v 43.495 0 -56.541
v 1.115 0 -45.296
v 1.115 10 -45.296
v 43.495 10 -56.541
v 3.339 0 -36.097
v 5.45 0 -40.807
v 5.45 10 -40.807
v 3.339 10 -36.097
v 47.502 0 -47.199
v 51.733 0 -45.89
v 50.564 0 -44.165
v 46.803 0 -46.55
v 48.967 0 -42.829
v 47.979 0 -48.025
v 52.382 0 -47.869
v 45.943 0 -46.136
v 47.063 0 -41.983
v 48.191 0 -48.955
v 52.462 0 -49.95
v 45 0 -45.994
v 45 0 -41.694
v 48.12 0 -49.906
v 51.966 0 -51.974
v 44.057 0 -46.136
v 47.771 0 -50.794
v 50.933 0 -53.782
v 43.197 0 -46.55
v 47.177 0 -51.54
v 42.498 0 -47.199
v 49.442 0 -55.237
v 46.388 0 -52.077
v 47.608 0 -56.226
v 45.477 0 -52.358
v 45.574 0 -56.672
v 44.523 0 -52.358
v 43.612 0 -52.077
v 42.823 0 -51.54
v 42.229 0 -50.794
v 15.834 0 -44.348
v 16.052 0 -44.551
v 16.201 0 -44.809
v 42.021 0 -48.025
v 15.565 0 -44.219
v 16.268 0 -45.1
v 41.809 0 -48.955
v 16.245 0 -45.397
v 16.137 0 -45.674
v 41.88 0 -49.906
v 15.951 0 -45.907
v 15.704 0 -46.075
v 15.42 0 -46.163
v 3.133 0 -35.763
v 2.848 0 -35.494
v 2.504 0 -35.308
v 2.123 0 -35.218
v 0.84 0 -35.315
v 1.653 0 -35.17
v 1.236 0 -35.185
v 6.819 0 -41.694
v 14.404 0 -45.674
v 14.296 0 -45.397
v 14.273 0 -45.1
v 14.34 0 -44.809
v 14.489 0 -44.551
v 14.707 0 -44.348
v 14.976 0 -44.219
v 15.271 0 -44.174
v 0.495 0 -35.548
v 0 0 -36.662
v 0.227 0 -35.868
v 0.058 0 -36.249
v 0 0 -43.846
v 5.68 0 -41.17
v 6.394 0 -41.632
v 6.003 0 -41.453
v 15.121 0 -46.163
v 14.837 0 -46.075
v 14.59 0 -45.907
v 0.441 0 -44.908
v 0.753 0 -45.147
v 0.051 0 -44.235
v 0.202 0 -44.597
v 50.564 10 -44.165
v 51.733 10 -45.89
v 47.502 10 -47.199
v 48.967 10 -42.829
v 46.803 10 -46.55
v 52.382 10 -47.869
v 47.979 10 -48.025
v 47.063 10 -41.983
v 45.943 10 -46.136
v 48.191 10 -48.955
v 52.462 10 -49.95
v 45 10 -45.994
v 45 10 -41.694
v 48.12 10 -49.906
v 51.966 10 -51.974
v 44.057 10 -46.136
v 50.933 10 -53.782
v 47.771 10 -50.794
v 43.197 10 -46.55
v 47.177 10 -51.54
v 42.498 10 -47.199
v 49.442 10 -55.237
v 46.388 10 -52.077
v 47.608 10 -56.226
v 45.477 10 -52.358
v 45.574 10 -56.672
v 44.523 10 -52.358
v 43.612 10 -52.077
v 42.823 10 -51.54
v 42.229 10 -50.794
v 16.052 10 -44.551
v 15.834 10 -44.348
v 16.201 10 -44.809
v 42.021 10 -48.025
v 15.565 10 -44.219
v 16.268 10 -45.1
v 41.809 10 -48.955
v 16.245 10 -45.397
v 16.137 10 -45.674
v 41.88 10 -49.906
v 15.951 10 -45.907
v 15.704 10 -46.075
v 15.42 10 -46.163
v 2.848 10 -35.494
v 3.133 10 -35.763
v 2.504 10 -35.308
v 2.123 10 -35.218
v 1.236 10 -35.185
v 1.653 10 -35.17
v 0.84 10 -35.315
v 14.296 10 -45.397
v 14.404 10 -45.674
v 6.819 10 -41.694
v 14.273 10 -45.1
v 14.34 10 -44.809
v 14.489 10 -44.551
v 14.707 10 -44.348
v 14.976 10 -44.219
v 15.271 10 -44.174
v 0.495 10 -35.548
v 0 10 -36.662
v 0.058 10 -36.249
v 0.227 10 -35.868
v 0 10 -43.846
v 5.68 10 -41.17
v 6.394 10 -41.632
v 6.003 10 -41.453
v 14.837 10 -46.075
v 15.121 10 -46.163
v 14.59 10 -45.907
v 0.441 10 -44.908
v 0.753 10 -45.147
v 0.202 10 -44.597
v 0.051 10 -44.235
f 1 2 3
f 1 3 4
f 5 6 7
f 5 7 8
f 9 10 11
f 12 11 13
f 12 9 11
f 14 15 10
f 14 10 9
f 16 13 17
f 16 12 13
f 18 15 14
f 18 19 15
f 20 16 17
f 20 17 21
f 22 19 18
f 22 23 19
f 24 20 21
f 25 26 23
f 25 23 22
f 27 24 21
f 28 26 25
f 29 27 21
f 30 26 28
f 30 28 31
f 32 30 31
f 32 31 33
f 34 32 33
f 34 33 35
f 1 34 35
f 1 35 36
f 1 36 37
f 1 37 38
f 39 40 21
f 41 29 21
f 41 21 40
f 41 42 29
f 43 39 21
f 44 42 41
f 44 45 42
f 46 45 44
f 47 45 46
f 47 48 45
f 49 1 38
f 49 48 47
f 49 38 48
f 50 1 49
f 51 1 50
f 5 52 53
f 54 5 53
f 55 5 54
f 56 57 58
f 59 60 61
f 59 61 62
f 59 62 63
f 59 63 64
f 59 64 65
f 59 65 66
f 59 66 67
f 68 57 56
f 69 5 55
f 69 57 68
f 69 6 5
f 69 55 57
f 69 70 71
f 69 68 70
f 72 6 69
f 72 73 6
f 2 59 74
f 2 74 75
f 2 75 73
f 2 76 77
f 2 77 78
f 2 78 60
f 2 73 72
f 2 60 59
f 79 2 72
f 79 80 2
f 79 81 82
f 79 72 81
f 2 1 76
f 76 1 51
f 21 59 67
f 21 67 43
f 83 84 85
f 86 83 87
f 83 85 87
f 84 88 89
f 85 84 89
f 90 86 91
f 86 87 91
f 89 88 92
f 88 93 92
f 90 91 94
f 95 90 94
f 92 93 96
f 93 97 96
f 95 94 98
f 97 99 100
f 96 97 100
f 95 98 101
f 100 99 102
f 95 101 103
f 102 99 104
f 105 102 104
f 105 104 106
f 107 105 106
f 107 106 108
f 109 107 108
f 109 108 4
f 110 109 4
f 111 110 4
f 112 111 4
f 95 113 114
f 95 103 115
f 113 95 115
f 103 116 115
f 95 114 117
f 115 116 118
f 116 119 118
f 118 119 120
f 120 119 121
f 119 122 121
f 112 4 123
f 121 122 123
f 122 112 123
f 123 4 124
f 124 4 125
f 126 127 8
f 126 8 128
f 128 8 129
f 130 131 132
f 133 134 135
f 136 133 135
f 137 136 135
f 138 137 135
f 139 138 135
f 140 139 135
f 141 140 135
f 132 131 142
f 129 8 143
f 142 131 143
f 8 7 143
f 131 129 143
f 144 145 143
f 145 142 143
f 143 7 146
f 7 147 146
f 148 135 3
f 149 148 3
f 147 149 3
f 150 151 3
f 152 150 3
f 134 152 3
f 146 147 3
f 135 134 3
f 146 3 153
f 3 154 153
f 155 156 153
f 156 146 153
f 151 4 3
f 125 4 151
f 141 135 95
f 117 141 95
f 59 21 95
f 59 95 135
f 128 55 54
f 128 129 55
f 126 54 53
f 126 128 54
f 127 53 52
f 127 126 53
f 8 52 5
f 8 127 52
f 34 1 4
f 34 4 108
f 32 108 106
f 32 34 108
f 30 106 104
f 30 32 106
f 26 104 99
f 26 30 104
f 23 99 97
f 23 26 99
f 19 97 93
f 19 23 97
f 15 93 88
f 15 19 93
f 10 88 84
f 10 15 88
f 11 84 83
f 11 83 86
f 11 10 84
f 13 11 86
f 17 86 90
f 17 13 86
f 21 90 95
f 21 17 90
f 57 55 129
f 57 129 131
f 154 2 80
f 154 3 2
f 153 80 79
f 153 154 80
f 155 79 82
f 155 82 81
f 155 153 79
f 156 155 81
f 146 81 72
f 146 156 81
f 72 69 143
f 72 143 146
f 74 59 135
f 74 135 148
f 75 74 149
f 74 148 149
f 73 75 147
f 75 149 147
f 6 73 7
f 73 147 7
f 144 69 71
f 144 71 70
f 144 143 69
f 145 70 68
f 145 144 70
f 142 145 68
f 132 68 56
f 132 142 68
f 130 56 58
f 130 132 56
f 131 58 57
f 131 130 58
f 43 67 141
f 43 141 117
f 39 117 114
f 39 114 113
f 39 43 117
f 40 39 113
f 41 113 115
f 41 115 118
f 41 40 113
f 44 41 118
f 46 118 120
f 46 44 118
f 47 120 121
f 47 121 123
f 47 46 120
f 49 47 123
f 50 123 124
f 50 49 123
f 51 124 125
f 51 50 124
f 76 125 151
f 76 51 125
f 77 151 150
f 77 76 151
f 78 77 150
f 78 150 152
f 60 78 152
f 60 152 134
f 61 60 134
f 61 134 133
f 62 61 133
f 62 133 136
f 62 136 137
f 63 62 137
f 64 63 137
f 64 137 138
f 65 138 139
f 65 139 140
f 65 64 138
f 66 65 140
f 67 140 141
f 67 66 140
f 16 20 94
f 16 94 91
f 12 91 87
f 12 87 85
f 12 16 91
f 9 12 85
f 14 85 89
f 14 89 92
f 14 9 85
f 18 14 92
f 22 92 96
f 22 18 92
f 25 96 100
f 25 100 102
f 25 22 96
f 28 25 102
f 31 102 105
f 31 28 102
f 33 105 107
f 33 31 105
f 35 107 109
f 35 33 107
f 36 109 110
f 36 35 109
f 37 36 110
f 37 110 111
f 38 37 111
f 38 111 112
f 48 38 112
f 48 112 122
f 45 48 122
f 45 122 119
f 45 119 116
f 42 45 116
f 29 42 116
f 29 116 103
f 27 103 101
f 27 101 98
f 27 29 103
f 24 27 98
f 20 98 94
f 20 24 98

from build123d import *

# Parameters (mm, degrees)
SKETCH1_R           = 3.2
SKETCH1_R_2         = 1
BOSS_EXTRUDE1_DEPTH = 10
FILLET1_R           = 1.5


with BuildPart() as part:
    # Sketch1 → Boss-Extrude1 (new body)
    with BuildSketch(Plane(origin=(0, 0, 0), x_dir=(1, 0, 0), z_dir=(0, 1, 0))):
        with BuildLine():
            Line((0, 45), (43.494782903, 56.541397673))
            ThreePointArc((43.494782903, 56.541397673), (52.461753069, 49.950461527), (45, 41.69399531))
            Line((45, 41.69399531), (5.847258058, 41.69399531))
            Line((5.847258058, 41.69399531), (2.984330404, 35.306222204))
            Line((2.984330404, 35.306222204), (0, 35))
            Line((0, 35), (0, 45))
        make_face()
        with Locations(Location((45, 49.19399531, 0), (0, 0, 270))):
            Circle(SKETCH1_R, mode=Mode.SUBTRACT)
        with Locations(Location((15.270504009, 45.174409747, 0), (0, 0, 270))):
            Circle(SKETCH1_R_2, mode=Mode.SUBTRACT)
    extrude(amount=BOSS_EXTRUDE1_DEPTH)

    # Fillet1
    fillet1_edges = [part.edges().sort_by_distance(p)[0] for p in [
        (5.847258058, 5, -41.69399531),
        (2.984330404, 5, -35.306222204),
        (0, 5, -35),
        (0, 5, -45),
    ]]
    fillet(fillet1_edges, radius=FILLET1_R)


solid = part.part
